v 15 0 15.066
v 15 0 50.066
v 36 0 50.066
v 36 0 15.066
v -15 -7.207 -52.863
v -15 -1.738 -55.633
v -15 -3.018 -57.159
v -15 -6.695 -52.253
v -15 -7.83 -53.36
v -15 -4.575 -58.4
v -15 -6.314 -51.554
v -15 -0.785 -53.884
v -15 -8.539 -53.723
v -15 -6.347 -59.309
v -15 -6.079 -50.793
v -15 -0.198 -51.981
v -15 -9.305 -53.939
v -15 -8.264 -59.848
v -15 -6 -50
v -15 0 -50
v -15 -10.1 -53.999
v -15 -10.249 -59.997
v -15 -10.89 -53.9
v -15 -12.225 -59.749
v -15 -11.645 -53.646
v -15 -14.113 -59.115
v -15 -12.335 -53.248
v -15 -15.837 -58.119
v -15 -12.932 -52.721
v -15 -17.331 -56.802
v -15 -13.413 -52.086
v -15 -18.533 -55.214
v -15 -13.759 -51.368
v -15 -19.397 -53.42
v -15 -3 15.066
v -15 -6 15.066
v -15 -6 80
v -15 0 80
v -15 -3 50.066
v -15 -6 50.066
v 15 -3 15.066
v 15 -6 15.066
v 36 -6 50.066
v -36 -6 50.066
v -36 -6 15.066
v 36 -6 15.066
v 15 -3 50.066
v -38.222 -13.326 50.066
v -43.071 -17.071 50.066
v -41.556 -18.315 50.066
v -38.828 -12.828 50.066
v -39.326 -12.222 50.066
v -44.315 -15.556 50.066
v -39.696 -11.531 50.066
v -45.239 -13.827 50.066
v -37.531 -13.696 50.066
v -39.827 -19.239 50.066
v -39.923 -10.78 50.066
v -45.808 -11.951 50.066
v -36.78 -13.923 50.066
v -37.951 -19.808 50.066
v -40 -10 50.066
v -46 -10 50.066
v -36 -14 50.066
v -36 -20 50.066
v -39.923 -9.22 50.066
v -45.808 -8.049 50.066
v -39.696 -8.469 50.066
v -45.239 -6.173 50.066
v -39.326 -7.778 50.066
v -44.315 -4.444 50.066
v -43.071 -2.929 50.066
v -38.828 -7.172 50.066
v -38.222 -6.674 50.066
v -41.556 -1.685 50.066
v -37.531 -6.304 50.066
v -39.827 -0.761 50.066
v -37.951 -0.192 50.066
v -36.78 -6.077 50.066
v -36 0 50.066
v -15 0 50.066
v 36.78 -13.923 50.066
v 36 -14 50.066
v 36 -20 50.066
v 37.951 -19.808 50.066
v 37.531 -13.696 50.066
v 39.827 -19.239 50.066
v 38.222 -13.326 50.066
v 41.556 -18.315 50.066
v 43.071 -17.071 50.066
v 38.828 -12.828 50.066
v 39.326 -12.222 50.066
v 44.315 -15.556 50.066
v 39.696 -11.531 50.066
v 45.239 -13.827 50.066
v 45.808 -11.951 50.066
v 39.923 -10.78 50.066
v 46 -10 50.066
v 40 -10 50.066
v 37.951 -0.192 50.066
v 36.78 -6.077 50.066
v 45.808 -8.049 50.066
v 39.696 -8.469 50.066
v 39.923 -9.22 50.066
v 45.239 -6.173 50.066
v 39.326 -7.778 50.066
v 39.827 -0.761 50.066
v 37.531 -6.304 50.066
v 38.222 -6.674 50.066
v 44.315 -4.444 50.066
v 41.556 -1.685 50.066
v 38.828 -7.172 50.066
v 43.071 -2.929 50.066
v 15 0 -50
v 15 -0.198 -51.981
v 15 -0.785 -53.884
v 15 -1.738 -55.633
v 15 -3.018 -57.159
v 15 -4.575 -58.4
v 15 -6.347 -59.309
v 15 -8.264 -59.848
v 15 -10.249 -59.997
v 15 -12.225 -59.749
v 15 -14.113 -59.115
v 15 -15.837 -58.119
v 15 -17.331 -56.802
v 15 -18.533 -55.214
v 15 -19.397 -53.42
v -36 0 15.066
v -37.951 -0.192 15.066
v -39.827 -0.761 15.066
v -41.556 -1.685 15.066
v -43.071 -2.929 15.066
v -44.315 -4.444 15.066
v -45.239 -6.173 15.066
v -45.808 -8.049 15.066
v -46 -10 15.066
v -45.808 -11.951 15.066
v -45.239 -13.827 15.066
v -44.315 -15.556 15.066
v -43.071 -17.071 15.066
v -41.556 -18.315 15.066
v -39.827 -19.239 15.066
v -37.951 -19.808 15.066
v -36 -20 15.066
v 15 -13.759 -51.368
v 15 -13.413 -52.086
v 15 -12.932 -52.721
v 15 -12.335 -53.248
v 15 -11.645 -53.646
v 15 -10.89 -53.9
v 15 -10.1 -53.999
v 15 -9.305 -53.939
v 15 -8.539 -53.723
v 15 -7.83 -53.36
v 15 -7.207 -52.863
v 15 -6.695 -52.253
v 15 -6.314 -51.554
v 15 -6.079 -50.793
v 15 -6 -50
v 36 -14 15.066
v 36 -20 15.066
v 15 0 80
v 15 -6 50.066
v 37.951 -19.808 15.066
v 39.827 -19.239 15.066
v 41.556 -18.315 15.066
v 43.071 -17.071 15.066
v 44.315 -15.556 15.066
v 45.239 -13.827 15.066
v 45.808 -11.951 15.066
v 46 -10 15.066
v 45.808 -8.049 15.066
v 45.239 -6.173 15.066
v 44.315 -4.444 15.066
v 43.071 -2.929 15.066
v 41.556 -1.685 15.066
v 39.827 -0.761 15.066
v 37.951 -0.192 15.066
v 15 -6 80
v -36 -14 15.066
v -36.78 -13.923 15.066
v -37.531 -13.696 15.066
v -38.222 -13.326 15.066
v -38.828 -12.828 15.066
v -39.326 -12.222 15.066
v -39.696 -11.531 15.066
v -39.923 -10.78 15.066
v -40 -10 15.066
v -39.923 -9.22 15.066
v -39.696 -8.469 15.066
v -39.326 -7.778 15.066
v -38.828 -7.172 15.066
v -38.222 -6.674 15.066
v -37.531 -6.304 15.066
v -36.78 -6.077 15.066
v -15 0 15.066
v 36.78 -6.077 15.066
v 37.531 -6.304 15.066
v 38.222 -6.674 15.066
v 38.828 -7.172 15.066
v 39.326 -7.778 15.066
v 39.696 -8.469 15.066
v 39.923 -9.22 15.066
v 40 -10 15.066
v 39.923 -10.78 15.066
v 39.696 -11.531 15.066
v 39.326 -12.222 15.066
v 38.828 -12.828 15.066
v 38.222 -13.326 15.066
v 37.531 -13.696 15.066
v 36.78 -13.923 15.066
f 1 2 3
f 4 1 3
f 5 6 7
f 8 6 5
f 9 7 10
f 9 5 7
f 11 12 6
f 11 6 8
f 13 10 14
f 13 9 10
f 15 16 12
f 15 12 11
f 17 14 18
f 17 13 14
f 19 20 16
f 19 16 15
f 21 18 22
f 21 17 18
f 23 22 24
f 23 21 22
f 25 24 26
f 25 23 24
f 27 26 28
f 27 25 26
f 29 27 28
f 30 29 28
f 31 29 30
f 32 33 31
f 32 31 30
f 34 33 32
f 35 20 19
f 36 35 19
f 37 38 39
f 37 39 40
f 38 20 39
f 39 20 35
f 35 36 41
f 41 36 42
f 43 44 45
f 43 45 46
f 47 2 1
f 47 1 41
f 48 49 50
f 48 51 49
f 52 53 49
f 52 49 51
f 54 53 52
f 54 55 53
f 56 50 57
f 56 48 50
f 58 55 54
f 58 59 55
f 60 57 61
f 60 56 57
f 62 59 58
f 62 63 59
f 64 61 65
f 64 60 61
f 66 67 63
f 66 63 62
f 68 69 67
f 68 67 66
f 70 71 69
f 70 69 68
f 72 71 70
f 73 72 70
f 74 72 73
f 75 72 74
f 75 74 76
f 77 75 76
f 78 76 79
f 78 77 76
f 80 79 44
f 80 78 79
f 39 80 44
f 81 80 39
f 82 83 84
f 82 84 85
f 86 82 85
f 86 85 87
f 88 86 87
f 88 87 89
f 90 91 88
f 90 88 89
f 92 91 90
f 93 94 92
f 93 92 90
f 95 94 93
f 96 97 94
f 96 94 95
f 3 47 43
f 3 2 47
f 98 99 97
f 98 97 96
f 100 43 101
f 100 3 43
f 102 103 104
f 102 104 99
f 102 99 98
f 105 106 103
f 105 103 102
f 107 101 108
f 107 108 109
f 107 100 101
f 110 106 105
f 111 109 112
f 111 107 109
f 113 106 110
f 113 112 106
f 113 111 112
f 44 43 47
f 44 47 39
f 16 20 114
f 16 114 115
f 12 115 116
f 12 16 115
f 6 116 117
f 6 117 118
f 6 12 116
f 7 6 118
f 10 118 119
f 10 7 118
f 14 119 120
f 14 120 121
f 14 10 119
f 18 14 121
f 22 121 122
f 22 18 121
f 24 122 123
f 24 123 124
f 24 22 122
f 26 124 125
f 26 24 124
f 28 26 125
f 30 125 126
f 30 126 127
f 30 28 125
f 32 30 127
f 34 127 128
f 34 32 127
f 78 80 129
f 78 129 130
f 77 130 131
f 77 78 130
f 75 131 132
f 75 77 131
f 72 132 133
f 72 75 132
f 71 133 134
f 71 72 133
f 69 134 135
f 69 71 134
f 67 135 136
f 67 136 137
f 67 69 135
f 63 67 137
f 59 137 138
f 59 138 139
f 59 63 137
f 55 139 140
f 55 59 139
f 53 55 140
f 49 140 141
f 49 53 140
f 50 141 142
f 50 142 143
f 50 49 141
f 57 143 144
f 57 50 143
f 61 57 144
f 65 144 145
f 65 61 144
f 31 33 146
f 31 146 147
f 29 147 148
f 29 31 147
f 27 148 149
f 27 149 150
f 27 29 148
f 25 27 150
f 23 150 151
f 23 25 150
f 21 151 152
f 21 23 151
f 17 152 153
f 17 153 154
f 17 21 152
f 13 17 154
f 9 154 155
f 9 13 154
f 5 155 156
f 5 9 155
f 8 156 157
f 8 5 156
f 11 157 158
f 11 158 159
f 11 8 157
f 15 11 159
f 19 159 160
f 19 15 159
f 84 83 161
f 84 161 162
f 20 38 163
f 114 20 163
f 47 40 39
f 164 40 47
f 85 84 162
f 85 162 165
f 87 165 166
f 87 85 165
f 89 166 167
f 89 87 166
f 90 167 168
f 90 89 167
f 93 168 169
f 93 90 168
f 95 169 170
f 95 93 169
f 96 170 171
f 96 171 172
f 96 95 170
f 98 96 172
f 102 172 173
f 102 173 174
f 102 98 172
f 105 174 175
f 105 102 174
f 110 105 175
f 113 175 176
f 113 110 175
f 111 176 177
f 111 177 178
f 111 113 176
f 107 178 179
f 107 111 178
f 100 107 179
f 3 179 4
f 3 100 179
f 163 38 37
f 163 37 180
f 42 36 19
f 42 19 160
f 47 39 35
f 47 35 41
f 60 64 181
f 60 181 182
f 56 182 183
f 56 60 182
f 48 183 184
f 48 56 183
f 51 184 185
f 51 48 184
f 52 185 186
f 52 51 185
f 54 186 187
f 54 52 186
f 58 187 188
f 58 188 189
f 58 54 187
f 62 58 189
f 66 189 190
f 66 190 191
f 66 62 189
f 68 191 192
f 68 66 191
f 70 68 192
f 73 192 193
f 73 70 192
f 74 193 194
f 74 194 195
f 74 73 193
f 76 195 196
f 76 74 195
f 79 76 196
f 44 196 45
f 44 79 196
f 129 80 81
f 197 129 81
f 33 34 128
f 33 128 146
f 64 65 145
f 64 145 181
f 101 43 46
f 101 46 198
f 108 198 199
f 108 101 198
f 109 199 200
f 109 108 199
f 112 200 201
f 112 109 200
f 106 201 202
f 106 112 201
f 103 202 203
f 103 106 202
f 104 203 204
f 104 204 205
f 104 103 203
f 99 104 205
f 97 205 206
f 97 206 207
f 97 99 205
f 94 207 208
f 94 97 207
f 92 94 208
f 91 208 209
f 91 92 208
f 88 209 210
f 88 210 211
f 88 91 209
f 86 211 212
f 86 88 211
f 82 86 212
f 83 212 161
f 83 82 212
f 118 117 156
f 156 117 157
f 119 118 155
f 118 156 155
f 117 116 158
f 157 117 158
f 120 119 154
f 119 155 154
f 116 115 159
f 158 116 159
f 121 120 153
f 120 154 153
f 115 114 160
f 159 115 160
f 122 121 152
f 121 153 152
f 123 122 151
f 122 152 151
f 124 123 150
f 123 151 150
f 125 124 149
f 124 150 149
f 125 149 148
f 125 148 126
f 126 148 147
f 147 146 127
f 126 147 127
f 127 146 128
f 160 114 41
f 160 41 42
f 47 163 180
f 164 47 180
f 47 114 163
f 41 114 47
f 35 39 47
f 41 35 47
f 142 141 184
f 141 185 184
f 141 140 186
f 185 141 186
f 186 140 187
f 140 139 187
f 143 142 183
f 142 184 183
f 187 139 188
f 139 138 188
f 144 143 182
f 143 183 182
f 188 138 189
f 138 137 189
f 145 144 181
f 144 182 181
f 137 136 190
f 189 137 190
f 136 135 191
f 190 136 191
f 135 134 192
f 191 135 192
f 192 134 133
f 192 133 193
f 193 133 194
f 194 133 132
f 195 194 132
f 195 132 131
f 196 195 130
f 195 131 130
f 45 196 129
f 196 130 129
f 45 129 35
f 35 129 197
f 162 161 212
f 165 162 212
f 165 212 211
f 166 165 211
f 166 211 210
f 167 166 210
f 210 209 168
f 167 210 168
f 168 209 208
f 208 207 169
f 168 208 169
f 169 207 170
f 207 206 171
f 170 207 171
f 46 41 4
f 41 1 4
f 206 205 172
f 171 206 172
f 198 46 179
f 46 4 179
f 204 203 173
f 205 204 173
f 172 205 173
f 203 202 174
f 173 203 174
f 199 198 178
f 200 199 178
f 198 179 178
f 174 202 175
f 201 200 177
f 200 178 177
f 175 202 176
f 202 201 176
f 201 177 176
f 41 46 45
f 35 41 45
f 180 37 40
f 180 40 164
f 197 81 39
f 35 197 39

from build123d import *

# Parameters (mm, degrees)
F0_W     = 30
F0_H     = 130
F1_DEPTH = 6
F3_DEPTH = 30
F4_W     = 72
F4_H     = 35
F5_DEPTH = 6
F7_DEPTH = 35
F8_W     = 30
F8_H     = 35
F9_DEPTH = 3


with BuildPart() as f1:
    # F0 (on Front) → F1 (new body)
    with BuildSketch(Plane.XZ):
        with Locations((0, 15)):
            Rectangle(F0_W, F0_H)
    extrude(amount=F1_DEPTH)

    # F2 (on face) → F3 (join, through all)
    with BuildSketch(Plane(origin=(-15, 0, 0), x_dir=(0, -1, 0), z_dir=(-1, 0, 0))):
        with BuildLine():
            Line((6, -50), (0, -50))
            ThreePointArc((0, -50), (8.2635182233, -59.8480775301), (19.3969262079, -53.4202014333))
            Line((19.3969262079, -53.4202014333), (13.7587704831, -51.3680805733))
            ThreePointArc((13.7587704831, -51.3680805733), (9.3054072893, -53.939231012), (6, -50))
        make_face()
    extrude(amount=-F3_DEPTH)

    # F8 (on face) → F9 (cut)
    with BuildSketch(Plane.XZ.offset(6)):
        with Locations((0, 32.5659681112)):
            Rectangle(F8_W, F8_H)
    extrude(amount=-F9_DEPTH, mode=Mode.SUBTRACT)


with BuildPart() as f5:
    # F4 (on Front) → F5 (new body, through all)
    with BuildSketch(Plane.XZ):
        with Locations((0, 32.5659681112)):
            Rectangle(F4_W, F4_H)
    extrude(amount=F5_DEPTH)

    # F6 (on face) → F7 (join, through all)
    with BuildSketch(Plane.XY.offset(50.0659681112)):
        with BuildLine():
            Line((-36, -6), (-36, 0))
            ThreePointArc((-36, 0), (-46, -10), (-36, -20))
            Line((-36, -20), (-36, -14))
            ThreePointArc((-36, -14), (-40, -10), (-36, -6))
        make_face()
        with BuildLine():
            ThreePointArc((36, -20), (46, -10), (36, 0))
            Line((36, 0), (36, -6))
            ThreePointArc((36, -6), (40, -10), (36, -14))
            Line((36, -14), (36, -20))
        make_face()
    extrude(amount=-F7_DEPTH)

    # F10: cut F1
    add(f1.part, mode=Mode.SUBTRACT)


solid = Compound([f1.part, f5.part])
